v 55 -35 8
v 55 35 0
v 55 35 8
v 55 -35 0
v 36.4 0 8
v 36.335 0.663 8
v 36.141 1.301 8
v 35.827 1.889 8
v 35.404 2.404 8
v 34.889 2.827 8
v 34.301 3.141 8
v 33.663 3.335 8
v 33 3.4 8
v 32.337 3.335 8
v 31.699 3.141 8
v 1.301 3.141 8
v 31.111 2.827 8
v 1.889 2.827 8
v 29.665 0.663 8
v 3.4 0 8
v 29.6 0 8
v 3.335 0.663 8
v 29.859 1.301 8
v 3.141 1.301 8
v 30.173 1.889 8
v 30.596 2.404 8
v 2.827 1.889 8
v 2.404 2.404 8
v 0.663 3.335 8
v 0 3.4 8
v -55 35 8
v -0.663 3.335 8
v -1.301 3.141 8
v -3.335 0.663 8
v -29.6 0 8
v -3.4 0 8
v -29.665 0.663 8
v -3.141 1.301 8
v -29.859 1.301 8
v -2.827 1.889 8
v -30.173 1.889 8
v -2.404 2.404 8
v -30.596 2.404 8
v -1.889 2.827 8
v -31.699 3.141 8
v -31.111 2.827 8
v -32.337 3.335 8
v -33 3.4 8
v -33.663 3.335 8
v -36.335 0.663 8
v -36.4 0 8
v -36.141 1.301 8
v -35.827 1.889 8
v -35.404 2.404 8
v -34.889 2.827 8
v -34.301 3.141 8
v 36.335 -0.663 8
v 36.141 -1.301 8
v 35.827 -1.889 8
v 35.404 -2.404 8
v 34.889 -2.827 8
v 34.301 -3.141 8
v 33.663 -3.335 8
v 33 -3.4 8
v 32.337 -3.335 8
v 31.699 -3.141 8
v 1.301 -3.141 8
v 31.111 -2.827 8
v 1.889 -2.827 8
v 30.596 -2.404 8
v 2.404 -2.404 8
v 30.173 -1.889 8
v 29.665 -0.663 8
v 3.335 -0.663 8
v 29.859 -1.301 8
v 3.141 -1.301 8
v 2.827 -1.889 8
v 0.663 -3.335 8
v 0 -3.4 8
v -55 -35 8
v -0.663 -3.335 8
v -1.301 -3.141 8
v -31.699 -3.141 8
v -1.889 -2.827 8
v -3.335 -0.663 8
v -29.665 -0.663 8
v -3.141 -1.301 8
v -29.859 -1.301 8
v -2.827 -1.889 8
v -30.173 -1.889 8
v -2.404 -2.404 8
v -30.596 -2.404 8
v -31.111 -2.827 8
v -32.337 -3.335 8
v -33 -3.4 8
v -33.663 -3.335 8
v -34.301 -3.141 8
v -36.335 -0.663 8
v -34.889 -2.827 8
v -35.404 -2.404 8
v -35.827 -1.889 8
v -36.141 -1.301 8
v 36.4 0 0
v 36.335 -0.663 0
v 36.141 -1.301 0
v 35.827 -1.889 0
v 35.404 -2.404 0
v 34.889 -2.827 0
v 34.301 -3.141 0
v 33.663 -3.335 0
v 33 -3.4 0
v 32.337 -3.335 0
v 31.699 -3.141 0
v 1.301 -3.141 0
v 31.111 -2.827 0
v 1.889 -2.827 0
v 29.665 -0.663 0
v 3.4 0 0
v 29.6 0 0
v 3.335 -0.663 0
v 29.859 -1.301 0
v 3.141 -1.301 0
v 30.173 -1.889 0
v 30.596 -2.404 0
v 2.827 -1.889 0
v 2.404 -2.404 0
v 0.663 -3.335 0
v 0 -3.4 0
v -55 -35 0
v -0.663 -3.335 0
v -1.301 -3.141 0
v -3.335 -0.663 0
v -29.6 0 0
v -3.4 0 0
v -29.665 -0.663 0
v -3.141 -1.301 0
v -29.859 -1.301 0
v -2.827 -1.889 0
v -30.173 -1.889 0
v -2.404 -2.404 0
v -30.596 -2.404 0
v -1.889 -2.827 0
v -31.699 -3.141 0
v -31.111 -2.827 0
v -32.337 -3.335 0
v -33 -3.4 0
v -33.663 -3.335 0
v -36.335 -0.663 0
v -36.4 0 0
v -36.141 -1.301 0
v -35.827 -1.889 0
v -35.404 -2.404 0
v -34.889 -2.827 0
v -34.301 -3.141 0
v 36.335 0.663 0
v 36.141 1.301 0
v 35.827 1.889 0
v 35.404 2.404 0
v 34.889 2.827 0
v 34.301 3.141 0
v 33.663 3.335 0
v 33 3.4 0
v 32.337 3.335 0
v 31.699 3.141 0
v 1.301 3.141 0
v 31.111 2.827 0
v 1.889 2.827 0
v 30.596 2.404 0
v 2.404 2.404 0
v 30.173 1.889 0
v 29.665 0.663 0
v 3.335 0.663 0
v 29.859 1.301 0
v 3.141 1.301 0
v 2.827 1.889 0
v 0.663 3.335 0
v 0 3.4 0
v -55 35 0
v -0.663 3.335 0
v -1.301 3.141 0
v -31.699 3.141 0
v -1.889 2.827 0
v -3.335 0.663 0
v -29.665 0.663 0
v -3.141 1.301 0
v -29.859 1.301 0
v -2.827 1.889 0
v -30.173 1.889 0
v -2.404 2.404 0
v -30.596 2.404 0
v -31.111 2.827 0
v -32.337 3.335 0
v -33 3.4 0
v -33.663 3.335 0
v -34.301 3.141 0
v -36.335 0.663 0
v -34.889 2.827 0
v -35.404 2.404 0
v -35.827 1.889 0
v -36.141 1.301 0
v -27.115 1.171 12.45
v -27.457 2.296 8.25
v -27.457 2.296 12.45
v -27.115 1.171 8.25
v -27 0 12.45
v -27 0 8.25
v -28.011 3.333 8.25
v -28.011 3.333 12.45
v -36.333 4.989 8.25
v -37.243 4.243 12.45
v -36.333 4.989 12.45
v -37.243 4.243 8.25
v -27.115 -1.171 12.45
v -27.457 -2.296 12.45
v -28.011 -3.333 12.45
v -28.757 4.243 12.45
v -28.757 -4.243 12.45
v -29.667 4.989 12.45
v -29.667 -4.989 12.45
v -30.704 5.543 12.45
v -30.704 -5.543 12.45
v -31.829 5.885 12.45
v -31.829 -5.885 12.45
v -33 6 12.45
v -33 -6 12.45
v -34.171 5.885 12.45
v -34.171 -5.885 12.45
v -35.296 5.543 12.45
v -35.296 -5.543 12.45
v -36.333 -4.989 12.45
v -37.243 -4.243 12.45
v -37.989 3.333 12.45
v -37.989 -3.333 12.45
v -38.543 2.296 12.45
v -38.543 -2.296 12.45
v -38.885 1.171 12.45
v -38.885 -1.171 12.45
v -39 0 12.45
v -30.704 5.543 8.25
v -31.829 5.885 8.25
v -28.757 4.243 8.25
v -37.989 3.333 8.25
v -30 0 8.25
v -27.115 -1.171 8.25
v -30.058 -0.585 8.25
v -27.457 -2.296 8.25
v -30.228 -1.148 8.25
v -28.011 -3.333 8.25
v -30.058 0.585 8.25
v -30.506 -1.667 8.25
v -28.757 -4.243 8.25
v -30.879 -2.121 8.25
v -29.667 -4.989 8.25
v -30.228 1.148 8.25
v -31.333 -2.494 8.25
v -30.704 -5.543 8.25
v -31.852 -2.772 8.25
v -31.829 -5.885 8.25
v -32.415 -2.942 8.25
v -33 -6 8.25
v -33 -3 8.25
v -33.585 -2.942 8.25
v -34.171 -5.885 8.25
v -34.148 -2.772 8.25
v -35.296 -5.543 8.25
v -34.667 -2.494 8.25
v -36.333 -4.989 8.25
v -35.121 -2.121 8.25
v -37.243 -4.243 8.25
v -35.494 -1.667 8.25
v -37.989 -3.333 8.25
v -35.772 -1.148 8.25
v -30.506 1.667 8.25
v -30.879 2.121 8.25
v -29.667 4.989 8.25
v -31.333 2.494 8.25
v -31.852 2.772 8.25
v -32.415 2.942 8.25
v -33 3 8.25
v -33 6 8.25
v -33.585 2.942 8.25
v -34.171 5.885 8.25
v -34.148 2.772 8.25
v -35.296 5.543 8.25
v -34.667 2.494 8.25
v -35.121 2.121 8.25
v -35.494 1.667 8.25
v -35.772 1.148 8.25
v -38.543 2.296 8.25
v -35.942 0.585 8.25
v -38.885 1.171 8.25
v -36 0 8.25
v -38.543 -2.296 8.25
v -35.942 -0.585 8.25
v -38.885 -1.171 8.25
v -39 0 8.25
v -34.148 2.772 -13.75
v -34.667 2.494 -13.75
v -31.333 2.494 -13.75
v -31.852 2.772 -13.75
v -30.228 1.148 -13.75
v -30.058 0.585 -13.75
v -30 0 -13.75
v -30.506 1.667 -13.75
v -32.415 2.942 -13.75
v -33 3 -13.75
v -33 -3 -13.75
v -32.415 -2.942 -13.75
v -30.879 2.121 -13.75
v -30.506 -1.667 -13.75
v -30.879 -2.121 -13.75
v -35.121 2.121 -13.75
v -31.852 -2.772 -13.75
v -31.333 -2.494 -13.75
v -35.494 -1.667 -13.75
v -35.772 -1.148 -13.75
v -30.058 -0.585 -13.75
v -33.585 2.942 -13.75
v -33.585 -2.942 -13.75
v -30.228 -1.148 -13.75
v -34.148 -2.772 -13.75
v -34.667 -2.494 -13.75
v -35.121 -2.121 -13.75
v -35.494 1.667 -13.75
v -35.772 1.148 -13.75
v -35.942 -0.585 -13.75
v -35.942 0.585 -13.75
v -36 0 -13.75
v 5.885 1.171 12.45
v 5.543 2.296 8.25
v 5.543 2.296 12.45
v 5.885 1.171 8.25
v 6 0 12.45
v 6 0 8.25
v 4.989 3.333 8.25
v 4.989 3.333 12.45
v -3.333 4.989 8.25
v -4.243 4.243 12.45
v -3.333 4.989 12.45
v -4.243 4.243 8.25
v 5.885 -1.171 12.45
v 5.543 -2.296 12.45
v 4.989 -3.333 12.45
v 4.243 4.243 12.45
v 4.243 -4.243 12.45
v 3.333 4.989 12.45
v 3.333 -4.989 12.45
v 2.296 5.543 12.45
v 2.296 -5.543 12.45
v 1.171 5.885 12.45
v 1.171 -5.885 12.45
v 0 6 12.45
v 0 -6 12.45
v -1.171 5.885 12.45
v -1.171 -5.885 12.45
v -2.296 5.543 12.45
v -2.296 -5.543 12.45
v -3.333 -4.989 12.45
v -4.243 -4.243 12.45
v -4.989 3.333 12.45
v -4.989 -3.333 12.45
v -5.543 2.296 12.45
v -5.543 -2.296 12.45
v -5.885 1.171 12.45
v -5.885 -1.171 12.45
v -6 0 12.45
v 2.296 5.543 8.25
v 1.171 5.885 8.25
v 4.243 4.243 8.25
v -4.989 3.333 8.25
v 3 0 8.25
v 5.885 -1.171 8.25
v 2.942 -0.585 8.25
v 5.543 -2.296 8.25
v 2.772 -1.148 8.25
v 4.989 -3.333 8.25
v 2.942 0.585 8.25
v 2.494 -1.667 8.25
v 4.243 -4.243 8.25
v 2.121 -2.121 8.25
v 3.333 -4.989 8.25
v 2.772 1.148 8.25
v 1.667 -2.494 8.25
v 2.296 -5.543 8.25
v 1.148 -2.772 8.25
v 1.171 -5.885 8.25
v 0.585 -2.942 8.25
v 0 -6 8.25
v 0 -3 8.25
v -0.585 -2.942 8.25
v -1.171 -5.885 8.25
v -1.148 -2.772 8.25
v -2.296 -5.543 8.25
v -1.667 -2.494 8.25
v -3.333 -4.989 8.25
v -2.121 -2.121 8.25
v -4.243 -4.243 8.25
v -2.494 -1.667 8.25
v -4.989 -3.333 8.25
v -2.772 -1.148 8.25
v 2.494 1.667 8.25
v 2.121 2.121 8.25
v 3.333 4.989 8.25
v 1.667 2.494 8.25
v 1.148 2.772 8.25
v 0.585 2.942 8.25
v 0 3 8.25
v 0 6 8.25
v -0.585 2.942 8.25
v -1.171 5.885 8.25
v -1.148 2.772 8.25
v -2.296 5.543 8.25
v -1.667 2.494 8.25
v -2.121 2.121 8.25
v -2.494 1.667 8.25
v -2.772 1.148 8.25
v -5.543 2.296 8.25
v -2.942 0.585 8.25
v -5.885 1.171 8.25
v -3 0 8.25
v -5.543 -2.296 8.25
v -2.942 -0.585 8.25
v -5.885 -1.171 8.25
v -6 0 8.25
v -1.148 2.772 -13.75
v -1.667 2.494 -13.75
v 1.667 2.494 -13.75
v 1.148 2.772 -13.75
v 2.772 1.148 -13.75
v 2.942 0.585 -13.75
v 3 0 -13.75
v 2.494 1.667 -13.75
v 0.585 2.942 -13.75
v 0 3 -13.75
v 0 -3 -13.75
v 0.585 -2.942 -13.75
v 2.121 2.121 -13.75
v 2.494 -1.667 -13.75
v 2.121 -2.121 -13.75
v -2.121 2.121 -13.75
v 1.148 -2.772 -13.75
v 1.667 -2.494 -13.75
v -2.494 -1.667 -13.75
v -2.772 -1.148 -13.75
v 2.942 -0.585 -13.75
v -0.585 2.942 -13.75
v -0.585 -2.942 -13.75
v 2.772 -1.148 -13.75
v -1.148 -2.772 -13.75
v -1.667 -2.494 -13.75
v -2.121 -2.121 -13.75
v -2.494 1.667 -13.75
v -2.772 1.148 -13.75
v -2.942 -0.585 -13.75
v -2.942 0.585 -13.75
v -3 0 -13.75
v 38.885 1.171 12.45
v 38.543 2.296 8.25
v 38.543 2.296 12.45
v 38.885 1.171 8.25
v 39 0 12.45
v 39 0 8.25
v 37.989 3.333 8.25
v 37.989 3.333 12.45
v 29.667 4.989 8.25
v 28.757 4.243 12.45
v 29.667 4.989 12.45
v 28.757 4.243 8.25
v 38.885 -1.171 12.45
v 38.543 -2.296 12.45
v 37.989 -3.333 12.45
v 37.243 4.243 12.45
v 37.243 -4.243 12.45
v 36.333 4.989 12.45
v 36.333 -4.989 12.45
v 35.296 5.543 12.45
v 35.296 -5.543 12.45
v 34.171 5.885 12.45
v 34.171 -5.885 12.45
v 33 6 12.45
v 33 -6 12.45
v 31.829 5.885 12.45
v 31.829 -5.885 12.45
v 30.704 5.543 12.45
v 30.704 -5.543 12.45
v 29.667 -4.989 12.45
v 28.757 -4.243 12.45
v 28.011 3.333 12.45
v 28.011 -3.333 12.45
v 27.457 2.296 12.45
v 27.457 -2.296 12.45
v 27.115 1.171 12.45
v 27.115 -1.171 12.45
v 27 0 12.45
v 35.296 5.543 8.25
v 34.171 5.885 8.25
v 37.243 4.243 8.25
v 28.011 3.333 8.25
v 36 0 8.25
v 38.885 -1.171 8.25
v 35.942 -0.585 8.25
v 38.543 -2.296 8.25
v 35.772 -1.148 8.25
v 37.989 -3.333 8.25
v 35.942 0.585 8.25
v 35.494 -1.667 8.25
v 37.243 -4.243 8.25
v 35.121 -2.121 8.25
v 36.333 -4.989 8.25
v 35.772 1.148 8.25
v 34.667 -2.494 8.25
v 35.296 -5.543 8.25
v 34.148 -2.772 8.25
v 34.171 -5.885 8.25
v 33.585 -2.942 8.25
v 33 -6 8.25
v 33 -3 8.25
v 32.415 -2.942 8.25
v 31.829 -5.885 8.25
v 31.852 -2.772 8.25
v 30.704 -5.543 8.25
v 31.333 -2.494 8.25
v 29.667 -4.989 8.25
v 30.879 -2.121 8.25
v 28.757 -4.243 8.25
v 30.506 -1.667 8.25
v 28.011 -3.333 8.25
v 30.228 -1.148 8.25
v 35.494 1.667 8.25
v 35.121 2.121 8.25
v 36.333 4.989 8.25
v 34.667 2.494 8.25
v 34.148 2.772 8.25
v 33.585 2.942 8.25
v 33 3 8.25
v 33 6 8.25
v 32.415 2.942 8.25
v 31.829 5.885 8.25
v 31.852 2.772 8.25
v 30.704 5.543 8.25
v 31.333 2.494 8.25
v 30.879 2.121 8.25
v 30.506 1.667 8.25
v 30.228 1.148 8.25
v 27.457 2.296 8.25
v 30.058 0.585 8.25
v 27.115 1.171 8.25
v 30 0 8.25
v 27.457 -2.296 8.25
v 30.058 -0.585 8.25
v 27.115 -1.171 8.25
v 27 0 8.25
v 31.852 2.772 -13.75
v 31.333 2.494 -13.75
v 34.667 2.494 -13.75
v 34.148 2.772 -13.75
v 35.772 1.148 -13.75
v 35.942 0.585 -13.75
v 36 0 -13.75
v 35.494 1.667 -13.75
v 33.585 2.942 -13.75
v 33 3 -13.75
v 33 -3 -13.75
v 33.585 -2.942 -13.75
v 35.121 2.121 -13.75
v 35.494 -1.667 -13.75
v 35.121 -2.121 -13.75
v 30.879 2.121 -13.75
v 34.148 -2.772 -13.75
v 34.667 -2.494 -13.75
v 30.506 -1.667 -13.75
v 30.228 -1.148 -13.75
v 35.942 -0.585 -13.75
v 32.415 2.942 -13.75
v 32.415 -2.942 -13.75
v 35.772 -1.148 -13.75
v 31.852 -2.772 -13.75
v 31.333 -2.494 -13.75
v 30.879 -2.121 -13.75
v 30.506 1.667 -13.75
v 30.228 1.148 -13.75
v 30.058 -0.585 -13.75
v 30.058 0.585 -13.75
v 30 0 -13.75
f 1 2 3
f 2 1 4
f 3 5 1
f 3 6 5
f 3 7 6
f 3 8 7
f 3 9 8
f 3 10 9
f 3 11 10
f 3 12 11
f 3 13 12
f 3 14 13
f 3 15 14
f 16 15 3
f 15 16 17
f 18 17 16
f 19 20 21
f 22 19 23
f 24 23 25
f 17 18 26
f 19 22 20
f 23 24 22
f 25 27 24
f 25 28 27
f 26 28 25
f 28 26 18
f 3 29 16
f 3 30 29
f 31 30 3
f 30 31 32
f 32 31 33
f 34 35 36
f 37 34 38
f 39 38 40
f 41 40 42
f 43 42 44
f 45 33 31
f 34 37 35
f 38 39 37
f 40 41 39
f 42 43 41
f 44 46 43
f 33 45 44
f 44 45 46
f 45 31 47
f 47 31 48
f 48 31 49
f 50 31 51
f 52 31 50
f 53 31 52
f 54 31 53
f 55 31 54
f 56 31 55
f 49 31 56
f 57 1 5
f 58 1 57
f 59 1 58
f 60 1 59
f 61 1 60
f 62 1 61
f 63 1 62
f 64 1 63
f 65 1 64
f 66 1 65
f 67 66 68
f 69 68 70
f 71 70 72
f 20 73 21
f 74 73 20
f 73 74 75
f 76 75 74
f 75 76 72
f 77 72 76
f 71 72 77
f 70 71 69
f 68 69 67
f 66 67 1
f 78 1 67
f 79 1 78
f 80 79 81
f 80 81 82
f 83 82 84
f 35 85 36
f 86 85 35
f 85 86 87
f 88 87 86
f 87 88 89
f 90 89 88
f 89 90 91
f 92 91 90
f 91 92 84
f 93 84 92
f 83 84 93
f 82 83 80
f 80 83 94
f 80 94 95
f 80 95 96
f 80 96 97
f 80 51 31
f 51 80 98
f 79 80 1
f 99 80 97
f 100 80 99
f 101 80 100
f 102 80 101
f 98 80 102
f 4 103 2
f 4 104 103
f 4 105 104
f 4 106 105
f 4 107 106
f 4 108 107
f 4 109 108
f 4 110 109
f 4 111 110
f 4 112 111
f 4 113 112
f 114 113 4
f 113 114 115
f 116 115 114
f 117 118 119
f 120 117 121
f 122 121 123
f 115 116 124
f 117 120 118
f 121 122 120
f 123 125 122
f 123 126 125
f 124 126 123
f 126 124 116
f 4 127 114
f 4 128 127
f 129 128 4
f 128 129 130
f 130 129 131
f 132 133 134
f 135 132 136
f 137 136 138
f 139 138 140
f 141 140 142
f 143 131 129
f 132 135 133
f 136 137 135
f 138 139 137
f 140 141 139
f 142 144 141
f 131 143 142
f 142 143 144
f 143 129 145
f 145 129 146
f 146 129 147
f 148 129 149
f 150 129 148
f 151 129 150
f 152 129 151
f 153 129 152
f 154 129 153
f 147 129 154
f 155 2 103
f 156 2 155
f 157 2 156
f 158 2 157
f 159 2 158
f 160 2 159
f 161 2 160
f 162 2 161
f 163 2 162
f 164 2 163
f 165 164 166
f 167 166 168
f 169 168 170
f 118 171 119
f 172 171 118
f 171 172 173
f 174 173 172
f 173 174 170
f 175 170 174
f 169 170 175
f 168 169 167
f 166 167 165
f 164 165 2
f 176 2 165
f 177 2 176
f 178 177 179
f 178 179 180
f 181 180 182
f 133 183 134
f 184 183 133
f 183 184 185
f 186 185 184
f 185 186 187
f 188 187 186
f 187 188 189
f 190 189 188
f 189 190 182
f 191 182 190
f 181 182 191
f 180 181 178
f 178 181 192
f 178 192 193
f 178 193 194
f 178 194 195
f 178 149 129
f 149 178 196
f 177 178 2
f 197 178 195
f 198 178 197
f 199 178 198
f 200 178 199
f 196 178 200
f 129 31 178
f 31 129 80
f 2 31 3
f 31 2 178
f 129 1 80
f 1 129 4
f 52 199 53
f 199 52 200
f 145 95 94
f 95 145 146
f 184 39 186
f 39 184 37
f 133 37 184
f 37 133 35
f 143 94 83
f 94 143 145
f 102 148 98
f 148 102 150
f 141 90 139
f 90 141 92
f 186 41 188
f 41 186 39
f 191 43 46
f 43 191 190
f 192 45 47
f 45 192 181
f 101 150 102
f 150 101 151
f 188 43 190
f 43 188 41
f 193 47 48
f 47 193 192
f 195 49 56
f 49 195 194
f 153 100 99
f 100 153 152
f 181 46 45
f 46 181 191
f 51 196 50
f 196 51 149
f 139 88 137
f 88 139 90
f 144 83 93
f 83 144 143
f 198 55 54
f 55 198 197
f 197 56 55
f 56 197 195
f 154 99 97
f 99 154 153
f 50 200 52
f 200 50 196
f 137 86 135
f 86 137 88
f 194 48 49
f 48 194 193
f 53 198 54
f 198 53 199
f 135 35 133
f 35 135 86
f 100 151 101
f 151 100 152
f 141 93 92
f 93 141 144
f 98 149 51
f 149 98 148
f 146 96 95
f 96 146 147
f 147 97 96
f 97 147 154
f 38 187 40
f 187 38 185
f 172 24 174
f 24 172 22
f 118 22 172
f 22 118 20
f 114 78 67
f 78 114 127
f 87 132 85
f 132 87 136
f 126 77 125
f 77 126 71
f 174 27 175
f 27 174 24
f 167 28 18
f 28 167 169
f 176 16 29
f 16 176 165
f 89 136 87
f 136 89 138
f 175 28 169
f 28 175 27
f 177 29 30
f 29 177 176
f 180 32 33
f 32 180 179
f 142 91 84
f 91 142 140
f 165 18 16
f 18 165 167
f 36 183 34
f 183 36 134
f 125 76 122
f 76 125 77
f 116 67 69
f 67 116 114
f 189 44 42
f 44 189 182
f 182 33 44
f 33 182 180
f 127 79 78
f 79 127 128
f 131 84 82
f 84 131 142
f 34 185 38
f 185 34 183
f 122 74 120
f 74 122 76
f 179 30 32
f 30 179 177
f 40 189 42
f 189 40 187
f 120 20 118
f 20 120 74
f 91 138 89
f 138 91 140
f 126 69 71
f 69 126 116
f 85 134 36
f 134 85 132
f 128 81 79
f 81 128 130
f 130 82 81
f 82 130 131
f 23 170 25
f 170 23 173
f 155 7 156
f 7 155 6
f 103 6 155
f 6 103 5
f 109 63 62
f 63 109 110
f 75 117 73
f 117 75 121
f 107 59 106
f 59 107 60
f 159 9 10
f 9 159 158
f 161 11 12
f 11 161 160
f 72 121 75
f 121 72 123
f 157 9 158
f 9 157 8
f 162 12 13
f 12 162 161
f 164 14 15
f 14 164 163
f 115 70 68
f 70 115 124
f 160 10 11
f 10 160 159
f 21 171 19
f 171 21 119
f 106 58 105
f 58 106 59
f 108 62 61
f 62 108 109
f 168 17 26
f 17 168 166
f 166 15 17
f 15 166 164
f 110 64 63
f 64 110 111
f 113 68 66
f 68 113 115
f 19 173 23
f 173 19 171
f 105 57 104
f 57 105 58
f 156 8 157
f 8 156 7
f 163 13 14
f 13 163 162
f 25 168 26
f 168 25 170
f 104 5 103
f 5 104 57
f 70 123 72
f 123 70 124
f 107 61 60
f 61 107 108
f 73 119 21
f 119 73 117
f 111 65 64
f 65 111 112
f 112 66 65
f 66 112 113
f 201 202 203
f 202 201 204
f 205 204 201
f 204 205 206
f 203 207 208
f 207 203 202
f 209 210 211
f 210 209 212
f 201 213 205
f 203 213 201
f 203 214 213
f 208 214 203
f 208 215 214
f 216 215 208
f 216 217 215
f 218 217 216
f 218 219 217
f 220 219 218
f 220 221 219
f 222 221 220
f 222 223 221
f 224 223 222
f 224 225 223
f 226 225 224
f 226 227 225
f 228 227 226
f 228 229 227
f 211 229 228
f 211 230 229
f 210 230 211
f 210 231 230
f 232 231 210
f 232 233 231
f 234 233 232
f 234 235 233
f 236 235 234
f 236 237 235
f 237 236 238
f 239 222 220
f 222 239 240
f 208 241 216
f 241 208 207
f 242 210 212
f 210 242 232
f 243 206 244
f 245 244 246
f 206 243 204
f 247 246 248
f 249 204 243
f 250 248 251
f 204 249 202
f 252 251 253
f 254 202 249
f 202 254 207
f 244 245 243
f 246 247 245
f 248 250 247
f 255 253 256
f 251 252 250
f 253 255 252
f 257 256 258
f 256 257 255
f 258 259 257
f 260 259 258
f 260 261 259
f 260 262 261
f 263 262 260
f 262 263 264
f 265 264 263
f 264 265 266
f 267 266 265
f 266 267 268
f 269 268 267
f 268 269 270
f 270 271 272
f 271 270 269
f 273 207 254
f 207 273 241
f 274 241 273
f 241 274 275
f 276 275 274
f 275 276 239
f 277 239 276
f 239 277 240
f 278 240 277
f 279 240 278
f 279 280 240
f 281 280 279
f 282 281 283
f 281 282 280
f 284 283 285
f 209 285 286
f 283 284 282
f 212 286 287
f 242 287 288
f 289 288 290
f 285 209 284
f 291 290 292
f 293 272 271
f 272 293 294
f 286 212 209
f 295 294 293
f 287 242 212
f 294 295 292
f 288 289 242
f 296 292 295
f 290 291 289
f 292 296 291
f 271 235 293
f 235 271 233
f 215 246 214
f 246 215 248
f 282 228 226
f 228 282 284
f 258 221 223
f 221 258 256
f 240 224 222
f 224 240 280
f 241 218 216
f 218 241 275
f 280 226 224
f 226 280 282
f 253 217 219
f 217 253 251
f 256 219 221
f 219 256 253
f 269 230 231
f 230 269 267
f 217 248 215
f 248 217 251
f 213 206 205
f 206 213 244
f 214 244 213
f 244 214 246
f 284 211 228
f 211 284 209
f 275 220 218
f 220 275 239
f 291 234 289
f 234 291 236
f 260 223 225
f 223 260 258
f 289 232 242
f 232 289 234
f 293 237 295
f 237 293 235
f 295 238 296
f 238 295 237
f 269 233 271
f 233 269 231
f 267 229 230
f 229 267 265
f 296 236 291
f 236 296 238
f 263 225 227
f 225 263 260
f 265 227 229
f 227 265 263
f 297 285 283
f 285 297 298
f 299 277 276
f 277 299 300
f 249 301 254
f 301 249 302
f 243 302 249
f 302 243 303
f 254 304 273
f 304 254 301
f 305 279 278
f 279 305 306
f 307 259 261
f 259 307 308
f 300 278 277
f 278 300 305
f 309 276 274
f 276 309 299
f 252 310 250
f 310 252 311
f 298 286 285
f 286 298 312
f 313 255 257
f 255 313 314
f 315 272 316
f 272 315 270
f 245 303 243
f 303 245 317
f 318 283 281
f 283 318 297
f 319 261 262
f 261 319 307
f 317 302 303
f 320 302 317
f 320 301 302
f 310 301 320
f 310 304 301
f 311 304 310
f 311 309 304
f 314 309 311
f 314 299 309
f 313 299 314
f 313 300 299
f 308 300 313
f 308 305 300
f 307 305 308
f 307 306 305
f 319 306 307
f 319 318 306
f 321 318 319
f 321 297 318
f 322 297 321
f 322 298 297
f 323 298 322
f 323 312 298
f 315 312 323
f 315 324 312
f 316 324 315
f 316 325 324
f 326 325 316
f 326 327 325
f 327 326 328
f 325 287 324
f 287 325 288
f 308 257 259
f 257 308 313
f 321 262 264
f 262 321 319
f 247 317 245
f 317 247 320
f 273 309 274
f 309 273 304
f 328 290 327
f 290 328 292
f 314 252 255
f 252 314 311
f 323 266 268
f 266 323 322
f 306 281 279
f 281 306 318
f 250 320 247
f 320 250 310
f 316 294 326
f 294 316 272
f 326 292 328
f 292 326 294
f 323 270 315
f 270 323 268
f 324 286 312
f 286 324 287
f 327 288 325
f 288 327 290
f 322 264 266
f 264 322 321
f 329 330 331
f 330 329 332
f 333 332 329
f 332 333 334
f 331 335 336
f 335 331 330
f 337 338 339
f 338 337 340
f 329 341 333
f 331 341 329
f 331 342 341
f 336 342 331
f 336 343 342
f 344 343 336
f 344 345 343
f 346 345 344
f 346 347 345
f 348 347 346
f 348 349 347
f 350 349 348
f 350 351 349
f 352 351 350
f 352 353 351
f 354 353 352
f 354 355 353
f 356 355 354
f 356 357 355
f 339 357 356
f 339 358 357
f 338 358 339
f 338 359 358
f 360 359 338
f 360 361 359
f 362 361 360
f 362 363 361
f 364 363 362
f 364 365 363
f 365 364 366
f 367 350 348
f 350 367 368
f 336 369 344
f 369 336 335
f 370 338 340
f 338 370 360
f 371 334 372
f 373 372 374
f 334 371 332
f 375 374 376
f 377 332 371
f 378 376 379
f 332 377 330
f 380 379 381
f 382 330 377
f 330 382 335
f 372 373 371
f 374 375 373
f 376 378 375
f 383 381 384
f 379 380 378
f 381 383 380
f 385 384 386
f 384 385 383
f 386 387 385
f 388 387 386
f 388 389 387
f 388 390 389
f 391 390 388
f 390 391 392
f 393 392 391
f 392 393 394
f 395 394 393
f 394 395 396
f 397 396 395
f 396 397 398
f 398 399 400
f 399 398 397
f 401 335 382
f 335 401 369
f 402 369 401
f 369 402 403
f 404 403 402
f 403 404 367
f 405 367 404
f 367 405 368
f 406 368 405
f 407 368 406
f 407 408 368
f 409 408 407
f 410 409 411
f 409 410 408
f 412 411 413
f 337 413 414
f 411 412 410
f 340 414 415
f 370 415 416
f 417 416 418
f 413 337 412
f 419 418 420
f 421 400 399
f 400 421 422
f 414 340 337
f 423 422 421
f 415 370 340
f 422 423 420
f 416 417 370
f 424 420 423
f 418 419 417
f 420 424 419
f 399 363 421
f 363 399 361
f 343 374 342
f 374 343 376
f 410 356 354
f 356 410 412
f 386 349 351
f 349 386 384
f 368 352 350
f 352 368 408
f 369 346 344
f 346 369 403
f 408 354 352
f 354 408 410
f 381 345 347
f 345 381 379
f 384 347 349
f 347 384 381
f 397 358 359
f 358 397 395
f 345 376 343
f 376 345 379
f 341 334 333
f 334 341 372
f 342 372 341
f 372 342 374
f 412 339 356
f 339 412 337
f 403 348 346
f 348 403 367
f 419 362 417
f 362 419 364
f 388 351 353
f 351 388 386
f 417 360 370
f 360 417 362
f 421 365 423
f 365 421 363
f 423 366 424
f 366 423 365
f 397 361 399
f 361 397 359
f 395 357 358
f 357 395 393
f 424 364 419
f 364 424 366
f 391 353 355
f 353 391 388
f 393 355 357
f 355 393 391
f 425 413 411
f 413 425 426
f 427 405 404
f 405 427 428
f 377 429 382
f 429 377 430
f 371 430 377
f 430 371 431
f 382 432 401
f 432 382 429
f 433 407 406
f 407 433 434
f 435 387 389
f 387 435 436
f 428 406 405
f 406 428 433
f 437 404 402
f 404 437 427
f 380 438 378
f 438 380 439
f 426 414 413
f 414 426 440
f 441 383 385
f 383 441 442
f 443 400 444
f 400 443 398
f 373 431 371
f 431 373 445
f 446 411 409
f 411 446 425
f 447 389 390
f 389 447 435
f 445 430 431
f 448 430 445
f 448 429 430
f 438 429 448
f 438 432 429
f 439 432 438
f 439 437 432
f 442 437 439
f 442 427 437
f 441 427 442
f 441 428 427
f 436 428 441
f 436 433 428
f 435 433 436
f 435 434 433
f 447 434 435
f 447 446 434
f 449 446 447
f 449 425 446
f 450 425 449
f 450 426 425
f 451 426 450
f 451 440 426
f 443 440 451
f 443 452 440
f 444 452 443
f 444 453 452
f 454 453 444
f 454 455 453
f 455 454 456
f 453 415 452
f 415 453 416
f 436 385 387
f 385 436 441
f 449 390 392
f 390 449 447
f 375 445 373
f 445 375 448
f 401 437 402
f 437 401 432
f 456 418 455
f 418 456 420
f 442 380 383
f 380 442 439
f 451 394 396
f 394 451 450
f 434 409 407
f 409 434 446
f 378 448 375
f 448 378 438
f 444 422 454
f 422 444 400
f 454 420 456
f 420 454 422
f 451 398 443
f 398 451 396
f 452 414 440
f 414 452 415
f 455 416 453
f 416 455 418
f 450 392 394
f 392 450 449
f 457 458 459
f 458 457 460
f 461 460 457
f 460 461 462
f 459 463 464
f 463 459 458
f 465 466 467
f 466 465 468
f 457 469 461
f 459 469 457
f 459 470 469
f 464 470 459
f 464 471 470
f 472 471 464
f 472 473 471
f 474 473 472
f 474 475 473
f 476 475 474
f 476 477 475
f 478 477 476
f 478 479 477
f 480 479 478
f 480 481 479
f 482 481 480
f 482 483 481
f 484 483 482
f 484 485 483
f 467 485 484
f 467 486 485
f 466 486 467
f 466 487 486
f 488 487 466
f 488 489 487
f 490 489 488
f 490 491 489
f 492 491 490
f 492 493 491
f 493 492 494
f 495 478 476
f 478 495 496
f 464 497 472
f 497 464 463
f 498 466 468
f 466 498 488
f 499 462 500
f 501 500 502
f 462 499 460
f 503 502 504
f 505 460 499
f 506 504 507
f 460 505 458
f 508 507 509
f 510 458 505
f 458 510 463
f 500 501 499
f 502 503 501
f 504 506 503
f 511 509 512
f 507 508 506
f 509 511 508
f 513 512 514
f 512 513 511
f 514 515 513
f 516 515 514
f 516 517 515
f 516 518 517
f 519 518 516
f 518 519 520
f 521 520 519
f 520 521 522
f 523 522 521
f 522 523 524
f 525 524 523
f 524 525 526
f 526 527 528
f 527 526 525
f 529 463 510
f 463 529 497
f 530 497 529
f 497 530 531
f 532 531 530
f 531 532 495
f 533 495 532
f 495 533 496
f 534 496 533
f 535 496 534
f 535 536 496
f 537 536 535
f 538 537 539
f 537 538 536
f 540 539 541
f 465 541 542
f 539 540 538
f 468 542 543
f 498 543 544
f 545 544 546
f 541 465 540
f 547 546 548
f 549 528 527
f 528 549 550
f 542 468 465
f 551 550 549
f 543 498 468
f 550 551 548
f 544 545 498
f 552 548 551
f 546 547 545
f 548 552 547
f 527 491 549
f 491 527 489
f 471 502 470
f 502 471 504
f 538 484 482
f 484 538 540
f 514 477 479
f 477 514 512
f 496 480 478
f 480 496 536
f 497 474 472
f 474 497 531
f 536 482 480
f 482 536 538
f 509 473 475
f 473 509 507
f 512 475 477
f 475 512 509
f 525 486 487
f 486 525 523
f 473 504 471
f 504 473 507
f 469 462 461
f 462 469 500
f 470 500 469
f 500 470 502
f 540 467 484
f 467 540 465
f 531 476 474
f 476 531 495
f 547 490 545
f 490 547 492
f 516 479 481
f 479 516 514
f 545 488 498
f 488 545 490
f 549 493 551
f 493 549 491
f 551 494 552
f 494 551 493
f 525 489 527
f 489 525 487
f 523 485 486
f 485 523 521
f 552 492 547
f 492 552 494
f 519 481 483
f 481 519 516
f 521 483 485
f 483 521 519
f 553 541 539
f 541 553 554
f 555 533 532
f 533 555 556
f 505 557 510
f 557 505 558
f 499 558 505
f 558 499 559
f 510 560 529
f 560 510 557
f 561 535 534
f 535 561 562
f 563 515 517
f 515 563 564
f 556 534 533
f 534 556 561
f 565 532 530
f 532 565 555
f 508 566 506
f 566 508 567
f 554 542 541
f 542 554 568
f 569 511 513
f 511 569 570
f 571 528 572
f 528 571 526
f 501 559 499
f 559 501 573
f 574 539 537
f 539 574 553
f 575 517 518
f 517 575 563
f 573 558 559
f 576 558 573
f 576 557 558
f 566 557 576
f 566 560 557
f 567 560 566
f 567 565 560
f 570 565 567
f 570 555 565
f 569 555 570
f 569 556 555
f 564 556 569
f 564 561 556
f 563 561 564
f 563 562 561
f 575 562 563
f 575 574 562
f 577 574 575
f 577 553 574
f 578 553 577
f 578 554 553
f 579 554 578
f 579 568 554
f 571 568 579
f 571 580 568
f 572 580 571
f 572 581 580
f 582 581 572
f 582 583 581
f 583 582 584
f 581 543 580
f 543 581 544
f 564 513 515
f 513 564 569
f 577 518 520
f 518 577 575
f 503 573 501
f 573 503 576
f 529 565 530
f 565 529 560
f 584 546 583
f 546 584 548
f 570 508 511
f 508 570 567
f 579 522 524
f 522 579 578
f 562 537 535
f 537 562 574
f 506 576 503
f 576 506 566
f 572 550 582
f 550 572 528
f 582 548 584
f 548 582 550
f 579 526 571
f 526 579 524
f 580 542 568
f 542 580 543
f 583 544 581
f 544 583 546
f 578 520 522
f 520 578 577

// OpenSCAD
$fn = 32;

// ------------------------------------------------------------------------
// Bolted plate: 110 x 70 x 8 mm plate, 3 fasteners
// Every part is its own module, assembly() places them once.
// ------------------------------------------------------------------------

// --- part 1 ---
module plate() {
  difference() {
    translate([-55, -35, 0]) cube([110, 70, 8]);
    translate([-33, 0, -1]) cylinder(h = 10, d = 6.8);
    translate([0, 0, -1]) cylinder(h = 10, d = 6.8);
    translate([33, 0, -1]) cylinder(h = 10, d = 6.8);
  }
}

// --- part 2 ---
module bolt1() {
  cylinder(h = 4.2, d = 12);
  translate([0, 0, -22]) cylinder(h = 22, d = 6);
}

// --- part 3 ---
module bolt2() {
  cylinder(h = 4.2, d = 12);
  translate([0, 0, -22]) cylinder(h = 22, d = 6);
}

// --- part 4 ---
module bolt3() {
  cylinder(h = 4.2, d = 12);
  translate([0, 0, -22]) cylinder(h = 22, d = 6);
}

// --- assembly ---
module assembly() {
  translate([0, 0, 0]) rotate([0, 0, 0]) plate();
  translate([-33, 0, 8.25]) rotate([0, 0, 0]) bolt1();
  translate([0, 0, 8.25]) rotate([0, 0, 0]) bolt2();
  translate([33, 0, 8.25]) rotate([0, 0, 0]) bolt3();
}

assembly();
